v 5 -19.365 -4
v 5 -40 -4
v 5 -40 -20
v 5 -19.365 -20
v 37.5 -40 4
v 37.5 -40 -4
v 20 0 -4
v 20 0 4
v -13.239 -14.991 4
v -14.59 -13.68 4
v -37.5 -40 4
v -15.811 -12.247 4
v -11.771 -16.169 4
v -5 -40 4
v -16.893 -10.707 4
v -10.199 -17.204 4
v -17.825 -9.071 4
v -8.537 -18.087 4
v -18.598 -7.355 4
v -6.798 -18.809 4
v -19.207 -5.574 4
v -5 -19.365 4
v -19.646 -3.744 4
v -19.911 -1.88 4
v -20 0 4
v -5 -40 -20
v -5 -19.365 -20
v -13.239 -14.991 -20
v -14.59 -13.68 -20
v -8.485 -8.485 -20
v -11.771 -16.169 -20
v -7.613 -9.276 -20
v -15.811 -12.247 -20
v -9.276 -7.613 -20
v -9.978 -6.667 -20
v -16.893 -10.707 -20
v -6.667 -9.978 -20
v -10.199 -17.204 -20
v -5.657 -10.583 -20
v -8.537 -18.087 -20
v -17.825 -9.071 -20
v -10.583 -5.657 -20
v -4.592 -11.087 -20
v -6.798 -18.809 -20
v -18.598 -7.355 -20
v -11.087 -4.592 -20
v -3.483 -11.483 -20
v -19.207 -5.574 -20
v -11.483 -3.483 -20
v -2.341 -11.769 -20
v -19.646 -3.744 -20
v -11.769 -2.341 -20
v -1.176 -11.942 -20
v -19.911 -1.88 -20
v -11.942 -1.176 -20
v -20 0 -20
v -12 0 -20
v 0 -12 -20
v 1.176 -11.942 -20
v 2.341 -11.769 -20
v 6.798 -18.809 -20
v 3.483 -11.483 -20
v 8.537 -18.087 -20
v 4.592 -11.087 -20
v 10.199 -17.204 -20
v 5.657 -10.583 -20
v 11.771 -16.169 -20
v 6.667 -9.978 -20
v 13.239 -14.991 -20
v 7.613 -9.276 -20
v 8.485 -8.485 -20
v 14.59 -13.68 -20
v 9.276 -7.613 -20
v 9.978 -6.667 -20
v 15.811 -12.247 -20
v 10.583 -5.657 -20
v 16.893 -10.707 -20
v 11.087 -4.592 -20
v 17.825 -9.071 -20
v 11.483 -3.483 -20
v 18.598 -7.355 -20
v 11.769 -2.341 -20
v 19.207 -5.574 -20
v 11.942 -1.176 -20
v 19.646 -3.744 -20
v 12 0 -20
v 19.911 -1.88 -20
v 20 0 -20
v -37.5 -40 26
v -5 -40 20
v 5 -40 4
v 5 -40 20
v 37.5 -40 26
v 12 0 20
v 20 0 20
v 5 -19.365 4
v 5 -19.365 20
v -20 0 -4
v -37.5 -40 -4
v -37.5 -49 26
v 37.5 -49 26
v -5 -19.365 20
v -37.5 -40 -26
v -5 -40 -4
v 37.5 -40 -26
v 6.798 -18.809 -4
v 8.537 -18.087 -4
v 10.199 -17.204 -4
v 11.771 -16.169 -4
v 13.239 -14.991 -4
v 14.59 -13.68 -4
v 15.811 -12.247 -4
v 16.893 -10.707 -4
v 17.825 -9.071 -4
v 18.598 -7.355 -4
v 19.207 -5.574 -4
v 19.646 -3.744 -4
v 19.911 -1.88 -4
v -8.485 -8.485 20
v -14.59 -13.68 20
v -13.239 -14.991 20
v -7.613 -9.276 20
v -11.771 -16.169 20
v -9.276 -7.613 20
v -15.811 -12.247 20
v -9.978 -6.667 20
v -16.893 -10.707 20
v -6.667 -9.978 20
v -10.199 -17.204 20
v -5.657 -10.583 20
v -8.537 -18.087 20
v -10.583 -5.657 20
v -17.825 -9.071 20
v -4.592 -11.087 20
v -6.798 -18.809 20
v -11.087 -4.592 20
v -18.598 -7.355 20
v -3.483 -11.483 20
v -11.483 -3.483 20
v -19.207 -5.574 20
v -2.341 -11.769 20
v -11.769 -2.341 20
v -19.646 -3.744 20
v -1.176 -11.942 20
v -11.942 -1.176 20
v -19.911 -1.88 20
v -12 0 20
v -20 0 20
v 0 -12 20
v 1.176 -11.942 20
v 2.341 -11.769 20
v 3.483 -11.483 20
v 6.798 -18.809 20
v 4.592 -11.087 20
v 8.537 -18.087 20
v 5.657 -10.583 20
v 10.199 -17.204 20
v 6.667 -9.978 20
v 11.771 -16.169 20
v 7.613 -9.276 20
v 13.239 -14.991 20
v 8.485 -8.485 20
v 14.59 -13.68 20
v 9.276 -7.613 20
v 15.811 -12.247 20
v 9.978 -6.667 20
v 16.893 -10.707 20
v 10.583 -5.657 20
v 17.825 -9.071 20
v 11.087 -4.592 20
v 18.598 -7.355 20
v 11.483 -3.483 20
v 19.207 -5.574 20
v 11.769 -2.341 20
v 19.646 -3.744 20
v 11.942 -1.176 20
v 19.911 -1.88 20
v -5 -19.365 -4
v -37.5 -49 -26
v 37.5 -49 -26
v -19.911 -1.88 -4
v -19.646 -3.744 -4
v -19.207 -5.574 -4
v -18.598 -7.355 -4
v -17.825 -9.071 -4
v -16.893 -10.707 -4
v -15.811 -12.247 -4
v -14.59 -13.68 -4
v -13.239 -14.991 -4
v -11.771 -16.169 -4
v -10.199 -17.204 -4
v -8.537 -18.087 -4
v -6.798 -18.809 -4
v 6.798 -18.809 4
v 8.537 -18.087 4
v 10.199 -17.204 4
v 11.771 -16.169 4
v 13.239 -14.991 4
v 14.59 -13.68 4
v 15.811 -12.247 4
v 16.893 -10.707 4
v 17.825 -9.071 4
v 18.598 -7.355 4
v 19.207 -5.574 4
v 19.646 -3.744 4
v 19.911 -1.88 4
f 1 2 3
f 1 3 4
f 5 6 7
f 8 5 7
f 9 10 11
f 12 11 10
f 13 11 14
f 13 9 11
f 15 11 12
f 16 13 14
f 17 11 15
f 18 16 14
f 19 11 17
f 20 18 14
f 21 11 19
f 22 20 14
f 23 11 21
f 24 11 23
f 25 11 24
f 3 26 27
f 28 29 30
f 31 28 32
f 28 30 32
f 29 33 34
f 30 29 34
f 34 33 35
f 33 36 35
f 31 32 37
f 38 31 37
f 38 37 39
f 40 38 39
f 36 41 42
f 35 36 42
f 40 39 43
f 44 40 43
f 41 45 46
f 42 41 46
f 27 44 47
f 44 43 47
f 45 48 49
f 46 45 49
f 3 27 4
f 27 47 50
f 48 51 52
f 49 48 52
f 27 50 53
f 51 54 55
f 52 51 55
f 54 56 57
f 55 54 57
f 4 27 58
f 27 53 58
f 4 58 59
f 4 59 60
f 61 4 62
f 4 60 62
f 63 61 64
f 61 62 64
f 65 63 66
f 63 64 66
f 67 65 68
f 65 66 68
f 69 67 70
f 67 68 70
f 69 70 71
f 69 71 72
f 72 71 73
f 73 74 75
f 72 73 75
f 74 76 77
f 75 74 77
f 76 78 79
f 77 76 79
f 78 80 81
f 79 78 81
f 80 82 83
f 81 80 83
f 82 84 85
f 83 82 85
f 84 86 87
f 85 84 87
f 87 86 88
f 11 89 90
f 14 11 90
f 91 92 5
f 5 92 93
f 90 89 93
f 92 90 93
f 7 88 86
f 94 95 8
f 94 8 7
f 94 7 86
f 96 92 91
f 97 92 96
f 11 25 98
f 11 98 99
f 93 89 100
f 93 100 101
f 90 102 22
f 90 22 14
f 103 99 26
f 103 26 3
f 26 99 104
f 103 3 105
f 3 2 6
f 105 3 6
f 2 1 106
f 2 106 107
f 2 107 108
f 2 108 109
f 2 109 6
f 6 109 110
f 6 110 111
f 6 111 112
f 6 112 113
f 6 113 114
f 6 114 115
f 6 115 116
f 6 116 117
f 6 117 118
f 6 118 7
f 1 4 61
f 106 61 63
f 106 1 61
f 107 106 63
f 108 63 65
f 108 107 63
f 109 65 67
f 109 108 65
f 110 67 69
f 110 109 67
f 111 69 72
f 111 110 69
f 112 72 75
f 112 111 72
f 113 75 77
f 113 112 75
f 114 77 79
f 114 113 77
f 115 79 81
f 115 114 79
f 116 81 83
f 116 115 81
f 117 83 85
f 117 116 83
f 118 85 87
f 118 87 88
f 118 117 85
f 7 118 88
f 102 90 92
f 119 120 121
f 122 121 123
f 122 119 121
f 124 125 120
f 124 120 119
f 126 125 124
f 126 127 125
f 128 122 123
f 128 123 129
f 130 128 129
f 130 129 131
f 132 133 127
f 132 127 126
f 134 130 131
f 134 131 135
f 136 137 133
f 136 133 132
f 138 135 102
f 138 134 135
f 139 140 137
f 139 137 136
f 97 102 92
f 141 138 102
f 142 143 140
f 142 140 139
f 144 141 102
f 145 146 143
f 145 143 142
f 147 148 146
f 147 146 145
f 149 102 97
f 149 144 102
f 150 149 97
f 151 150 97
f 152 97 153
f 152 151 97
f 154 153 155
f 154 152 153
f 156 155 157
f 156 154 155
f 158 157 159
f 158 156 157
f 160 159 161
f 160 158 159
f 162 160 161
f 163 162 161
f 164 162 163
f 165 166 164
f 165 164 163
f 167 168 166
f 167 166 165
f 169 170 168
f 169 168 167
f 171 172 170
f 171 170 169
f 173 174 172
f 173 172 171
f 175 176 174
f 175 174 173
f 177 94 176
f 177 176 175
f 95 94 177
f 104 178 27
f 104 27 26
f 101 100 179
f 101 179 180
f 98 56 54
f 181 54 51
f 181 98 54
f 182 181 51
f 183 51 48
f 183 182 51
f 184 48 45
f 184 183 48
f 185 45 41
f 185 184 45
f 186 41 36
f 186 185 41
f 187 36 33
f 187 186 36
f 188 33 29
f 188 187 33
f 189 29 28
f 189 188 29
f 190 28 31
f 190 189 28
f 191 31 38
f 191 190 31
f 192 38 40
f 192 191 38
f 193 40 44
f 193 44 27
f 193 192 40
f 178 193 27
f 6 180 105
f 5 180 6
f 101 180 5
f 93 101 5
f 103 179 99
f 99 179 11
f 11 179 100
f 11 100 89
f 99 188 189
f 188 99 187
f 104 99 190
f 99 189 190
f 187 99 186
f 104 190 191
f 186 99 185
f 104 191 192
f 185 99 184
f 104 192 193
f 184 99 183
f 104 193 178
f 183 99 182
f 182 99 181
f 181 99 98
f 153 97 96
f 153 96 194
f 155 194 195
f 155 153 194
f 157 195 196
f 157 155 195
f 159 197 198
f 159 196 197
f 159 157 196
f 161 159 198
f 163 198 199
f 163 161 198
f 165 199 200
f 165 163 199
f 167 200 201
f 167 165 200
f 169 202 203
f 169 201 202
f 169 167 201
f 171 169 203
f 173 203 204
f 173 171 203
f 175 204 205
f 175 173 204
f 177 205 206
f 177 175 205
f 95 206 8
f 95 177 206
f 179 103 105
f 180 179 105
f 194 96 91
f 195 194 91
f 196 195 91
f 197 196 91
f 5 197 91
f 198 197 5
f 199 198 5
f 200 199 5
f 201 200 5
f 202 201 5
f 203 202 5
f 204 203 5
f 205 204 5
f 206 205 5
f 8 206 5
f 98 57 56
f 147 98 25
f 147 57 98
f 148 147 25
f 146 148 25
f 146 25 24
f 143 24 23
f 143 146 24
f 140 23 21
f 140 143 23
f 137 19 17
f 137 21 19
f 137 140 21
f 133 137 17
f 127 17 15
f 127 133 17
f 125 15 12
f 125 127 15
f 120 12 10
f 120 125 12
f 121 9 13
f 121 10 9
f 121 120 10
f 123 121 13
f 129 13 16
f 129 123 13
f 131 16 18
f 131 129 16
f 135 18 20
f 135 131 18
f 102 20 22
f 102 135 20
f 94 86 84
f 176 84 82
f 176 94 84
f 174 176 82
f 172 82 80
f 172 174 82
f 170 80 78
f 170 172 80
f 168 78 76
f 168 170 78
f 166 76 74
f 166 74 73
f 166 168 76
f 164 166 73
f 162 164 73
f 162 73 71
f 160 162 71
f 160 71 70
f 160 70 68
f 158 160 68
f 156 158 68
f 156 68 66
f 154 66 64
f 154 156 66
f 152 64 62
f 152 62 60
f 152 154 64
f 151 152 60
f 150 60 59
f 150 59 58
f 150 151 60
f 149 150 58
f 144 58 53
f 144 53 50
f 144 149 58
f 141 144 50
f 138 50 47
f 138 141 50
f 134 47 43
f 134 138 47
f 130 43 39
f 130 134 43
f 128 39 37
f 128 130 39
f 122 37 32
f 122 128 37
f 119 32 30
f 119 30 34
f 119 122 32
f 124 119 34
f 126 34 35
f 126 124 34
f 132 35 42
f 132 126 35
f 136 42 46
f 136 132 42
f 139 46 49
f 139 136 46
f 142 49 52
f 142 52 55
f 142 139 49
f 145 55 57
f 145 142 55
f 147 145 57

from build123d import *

# Parameters (mm, degrees)
BOSS_EXTRUDE1_DEPTH = 26
BOSS_EXTRUDE2_DEPTH = 20
BOSS_EXTRUDE3_DEPTH = 4


with BuildPart() as part:
    # Sketch2 → Boss-Extrude1 (new, symmetric)
    with BuildSketch(Plane.XY):
        Polygon((-5, -40), (-37.5, -40), (-37.5, -49), (37.5, -49), (37.5, -40), (5, -40), align=None)
    extrude(amount=BOSS_EXTRUDE1_DEPTH, both=True)

    # Sketch2<4> → Boss-Extrude2 (add, symmetric)
    with BuildSketch(Plane.XY):
        with BuildLine():
            Line((-12, 0), (-20, 0))
            ThreePointArc((-20, 0), (-15.811388301, -12.247448714), (-5, -19.364916731))
            Line((-5, -19.364916731), (-5, -40))
            Line((-5, -40), (5, -40))
            Line((5, -40), (5, -19.364916731))
            ThreePointArc((5, -19.364916731), (15.811388301, -12.247448714), (20, 0))
            Line((20, 0), (12, 0))
            ThreePointArc((12, 0), (0, -12), (-12, 0))
        make_face()
    extrude(amount=BOSS_EXTRUDE2_DEPTH, both=True)

    # Sketch2<5> → Boss-Extrude3 (add, symmetric)
    with BuildSketch(Plane.XY):
        with BuildLine():
            ThreePointArc((-5, -19.364916731), (-15.811388301, -12.247448714), (-20, 0))
            Line((-20, 0), (-37.5, -40))
            Line((-37.5, -40), (-5, -40))
            Line((-5, -40), (-5, -19.364916731))
        make_face()
        with BuildLine():
            Line((37.5, -40), (20, 0))
            ThreePointArc((20, 0), (15.811388301, -12.247448714), (5, -19.364916731))
            Line((5, -19.364916731), (5, -40))
            Line((5, -40), (37.5, -40))
        make_face()
    extrude(amount=BOSS_EXTRUDE3_DEPTH, both=True)


solid = part.part
